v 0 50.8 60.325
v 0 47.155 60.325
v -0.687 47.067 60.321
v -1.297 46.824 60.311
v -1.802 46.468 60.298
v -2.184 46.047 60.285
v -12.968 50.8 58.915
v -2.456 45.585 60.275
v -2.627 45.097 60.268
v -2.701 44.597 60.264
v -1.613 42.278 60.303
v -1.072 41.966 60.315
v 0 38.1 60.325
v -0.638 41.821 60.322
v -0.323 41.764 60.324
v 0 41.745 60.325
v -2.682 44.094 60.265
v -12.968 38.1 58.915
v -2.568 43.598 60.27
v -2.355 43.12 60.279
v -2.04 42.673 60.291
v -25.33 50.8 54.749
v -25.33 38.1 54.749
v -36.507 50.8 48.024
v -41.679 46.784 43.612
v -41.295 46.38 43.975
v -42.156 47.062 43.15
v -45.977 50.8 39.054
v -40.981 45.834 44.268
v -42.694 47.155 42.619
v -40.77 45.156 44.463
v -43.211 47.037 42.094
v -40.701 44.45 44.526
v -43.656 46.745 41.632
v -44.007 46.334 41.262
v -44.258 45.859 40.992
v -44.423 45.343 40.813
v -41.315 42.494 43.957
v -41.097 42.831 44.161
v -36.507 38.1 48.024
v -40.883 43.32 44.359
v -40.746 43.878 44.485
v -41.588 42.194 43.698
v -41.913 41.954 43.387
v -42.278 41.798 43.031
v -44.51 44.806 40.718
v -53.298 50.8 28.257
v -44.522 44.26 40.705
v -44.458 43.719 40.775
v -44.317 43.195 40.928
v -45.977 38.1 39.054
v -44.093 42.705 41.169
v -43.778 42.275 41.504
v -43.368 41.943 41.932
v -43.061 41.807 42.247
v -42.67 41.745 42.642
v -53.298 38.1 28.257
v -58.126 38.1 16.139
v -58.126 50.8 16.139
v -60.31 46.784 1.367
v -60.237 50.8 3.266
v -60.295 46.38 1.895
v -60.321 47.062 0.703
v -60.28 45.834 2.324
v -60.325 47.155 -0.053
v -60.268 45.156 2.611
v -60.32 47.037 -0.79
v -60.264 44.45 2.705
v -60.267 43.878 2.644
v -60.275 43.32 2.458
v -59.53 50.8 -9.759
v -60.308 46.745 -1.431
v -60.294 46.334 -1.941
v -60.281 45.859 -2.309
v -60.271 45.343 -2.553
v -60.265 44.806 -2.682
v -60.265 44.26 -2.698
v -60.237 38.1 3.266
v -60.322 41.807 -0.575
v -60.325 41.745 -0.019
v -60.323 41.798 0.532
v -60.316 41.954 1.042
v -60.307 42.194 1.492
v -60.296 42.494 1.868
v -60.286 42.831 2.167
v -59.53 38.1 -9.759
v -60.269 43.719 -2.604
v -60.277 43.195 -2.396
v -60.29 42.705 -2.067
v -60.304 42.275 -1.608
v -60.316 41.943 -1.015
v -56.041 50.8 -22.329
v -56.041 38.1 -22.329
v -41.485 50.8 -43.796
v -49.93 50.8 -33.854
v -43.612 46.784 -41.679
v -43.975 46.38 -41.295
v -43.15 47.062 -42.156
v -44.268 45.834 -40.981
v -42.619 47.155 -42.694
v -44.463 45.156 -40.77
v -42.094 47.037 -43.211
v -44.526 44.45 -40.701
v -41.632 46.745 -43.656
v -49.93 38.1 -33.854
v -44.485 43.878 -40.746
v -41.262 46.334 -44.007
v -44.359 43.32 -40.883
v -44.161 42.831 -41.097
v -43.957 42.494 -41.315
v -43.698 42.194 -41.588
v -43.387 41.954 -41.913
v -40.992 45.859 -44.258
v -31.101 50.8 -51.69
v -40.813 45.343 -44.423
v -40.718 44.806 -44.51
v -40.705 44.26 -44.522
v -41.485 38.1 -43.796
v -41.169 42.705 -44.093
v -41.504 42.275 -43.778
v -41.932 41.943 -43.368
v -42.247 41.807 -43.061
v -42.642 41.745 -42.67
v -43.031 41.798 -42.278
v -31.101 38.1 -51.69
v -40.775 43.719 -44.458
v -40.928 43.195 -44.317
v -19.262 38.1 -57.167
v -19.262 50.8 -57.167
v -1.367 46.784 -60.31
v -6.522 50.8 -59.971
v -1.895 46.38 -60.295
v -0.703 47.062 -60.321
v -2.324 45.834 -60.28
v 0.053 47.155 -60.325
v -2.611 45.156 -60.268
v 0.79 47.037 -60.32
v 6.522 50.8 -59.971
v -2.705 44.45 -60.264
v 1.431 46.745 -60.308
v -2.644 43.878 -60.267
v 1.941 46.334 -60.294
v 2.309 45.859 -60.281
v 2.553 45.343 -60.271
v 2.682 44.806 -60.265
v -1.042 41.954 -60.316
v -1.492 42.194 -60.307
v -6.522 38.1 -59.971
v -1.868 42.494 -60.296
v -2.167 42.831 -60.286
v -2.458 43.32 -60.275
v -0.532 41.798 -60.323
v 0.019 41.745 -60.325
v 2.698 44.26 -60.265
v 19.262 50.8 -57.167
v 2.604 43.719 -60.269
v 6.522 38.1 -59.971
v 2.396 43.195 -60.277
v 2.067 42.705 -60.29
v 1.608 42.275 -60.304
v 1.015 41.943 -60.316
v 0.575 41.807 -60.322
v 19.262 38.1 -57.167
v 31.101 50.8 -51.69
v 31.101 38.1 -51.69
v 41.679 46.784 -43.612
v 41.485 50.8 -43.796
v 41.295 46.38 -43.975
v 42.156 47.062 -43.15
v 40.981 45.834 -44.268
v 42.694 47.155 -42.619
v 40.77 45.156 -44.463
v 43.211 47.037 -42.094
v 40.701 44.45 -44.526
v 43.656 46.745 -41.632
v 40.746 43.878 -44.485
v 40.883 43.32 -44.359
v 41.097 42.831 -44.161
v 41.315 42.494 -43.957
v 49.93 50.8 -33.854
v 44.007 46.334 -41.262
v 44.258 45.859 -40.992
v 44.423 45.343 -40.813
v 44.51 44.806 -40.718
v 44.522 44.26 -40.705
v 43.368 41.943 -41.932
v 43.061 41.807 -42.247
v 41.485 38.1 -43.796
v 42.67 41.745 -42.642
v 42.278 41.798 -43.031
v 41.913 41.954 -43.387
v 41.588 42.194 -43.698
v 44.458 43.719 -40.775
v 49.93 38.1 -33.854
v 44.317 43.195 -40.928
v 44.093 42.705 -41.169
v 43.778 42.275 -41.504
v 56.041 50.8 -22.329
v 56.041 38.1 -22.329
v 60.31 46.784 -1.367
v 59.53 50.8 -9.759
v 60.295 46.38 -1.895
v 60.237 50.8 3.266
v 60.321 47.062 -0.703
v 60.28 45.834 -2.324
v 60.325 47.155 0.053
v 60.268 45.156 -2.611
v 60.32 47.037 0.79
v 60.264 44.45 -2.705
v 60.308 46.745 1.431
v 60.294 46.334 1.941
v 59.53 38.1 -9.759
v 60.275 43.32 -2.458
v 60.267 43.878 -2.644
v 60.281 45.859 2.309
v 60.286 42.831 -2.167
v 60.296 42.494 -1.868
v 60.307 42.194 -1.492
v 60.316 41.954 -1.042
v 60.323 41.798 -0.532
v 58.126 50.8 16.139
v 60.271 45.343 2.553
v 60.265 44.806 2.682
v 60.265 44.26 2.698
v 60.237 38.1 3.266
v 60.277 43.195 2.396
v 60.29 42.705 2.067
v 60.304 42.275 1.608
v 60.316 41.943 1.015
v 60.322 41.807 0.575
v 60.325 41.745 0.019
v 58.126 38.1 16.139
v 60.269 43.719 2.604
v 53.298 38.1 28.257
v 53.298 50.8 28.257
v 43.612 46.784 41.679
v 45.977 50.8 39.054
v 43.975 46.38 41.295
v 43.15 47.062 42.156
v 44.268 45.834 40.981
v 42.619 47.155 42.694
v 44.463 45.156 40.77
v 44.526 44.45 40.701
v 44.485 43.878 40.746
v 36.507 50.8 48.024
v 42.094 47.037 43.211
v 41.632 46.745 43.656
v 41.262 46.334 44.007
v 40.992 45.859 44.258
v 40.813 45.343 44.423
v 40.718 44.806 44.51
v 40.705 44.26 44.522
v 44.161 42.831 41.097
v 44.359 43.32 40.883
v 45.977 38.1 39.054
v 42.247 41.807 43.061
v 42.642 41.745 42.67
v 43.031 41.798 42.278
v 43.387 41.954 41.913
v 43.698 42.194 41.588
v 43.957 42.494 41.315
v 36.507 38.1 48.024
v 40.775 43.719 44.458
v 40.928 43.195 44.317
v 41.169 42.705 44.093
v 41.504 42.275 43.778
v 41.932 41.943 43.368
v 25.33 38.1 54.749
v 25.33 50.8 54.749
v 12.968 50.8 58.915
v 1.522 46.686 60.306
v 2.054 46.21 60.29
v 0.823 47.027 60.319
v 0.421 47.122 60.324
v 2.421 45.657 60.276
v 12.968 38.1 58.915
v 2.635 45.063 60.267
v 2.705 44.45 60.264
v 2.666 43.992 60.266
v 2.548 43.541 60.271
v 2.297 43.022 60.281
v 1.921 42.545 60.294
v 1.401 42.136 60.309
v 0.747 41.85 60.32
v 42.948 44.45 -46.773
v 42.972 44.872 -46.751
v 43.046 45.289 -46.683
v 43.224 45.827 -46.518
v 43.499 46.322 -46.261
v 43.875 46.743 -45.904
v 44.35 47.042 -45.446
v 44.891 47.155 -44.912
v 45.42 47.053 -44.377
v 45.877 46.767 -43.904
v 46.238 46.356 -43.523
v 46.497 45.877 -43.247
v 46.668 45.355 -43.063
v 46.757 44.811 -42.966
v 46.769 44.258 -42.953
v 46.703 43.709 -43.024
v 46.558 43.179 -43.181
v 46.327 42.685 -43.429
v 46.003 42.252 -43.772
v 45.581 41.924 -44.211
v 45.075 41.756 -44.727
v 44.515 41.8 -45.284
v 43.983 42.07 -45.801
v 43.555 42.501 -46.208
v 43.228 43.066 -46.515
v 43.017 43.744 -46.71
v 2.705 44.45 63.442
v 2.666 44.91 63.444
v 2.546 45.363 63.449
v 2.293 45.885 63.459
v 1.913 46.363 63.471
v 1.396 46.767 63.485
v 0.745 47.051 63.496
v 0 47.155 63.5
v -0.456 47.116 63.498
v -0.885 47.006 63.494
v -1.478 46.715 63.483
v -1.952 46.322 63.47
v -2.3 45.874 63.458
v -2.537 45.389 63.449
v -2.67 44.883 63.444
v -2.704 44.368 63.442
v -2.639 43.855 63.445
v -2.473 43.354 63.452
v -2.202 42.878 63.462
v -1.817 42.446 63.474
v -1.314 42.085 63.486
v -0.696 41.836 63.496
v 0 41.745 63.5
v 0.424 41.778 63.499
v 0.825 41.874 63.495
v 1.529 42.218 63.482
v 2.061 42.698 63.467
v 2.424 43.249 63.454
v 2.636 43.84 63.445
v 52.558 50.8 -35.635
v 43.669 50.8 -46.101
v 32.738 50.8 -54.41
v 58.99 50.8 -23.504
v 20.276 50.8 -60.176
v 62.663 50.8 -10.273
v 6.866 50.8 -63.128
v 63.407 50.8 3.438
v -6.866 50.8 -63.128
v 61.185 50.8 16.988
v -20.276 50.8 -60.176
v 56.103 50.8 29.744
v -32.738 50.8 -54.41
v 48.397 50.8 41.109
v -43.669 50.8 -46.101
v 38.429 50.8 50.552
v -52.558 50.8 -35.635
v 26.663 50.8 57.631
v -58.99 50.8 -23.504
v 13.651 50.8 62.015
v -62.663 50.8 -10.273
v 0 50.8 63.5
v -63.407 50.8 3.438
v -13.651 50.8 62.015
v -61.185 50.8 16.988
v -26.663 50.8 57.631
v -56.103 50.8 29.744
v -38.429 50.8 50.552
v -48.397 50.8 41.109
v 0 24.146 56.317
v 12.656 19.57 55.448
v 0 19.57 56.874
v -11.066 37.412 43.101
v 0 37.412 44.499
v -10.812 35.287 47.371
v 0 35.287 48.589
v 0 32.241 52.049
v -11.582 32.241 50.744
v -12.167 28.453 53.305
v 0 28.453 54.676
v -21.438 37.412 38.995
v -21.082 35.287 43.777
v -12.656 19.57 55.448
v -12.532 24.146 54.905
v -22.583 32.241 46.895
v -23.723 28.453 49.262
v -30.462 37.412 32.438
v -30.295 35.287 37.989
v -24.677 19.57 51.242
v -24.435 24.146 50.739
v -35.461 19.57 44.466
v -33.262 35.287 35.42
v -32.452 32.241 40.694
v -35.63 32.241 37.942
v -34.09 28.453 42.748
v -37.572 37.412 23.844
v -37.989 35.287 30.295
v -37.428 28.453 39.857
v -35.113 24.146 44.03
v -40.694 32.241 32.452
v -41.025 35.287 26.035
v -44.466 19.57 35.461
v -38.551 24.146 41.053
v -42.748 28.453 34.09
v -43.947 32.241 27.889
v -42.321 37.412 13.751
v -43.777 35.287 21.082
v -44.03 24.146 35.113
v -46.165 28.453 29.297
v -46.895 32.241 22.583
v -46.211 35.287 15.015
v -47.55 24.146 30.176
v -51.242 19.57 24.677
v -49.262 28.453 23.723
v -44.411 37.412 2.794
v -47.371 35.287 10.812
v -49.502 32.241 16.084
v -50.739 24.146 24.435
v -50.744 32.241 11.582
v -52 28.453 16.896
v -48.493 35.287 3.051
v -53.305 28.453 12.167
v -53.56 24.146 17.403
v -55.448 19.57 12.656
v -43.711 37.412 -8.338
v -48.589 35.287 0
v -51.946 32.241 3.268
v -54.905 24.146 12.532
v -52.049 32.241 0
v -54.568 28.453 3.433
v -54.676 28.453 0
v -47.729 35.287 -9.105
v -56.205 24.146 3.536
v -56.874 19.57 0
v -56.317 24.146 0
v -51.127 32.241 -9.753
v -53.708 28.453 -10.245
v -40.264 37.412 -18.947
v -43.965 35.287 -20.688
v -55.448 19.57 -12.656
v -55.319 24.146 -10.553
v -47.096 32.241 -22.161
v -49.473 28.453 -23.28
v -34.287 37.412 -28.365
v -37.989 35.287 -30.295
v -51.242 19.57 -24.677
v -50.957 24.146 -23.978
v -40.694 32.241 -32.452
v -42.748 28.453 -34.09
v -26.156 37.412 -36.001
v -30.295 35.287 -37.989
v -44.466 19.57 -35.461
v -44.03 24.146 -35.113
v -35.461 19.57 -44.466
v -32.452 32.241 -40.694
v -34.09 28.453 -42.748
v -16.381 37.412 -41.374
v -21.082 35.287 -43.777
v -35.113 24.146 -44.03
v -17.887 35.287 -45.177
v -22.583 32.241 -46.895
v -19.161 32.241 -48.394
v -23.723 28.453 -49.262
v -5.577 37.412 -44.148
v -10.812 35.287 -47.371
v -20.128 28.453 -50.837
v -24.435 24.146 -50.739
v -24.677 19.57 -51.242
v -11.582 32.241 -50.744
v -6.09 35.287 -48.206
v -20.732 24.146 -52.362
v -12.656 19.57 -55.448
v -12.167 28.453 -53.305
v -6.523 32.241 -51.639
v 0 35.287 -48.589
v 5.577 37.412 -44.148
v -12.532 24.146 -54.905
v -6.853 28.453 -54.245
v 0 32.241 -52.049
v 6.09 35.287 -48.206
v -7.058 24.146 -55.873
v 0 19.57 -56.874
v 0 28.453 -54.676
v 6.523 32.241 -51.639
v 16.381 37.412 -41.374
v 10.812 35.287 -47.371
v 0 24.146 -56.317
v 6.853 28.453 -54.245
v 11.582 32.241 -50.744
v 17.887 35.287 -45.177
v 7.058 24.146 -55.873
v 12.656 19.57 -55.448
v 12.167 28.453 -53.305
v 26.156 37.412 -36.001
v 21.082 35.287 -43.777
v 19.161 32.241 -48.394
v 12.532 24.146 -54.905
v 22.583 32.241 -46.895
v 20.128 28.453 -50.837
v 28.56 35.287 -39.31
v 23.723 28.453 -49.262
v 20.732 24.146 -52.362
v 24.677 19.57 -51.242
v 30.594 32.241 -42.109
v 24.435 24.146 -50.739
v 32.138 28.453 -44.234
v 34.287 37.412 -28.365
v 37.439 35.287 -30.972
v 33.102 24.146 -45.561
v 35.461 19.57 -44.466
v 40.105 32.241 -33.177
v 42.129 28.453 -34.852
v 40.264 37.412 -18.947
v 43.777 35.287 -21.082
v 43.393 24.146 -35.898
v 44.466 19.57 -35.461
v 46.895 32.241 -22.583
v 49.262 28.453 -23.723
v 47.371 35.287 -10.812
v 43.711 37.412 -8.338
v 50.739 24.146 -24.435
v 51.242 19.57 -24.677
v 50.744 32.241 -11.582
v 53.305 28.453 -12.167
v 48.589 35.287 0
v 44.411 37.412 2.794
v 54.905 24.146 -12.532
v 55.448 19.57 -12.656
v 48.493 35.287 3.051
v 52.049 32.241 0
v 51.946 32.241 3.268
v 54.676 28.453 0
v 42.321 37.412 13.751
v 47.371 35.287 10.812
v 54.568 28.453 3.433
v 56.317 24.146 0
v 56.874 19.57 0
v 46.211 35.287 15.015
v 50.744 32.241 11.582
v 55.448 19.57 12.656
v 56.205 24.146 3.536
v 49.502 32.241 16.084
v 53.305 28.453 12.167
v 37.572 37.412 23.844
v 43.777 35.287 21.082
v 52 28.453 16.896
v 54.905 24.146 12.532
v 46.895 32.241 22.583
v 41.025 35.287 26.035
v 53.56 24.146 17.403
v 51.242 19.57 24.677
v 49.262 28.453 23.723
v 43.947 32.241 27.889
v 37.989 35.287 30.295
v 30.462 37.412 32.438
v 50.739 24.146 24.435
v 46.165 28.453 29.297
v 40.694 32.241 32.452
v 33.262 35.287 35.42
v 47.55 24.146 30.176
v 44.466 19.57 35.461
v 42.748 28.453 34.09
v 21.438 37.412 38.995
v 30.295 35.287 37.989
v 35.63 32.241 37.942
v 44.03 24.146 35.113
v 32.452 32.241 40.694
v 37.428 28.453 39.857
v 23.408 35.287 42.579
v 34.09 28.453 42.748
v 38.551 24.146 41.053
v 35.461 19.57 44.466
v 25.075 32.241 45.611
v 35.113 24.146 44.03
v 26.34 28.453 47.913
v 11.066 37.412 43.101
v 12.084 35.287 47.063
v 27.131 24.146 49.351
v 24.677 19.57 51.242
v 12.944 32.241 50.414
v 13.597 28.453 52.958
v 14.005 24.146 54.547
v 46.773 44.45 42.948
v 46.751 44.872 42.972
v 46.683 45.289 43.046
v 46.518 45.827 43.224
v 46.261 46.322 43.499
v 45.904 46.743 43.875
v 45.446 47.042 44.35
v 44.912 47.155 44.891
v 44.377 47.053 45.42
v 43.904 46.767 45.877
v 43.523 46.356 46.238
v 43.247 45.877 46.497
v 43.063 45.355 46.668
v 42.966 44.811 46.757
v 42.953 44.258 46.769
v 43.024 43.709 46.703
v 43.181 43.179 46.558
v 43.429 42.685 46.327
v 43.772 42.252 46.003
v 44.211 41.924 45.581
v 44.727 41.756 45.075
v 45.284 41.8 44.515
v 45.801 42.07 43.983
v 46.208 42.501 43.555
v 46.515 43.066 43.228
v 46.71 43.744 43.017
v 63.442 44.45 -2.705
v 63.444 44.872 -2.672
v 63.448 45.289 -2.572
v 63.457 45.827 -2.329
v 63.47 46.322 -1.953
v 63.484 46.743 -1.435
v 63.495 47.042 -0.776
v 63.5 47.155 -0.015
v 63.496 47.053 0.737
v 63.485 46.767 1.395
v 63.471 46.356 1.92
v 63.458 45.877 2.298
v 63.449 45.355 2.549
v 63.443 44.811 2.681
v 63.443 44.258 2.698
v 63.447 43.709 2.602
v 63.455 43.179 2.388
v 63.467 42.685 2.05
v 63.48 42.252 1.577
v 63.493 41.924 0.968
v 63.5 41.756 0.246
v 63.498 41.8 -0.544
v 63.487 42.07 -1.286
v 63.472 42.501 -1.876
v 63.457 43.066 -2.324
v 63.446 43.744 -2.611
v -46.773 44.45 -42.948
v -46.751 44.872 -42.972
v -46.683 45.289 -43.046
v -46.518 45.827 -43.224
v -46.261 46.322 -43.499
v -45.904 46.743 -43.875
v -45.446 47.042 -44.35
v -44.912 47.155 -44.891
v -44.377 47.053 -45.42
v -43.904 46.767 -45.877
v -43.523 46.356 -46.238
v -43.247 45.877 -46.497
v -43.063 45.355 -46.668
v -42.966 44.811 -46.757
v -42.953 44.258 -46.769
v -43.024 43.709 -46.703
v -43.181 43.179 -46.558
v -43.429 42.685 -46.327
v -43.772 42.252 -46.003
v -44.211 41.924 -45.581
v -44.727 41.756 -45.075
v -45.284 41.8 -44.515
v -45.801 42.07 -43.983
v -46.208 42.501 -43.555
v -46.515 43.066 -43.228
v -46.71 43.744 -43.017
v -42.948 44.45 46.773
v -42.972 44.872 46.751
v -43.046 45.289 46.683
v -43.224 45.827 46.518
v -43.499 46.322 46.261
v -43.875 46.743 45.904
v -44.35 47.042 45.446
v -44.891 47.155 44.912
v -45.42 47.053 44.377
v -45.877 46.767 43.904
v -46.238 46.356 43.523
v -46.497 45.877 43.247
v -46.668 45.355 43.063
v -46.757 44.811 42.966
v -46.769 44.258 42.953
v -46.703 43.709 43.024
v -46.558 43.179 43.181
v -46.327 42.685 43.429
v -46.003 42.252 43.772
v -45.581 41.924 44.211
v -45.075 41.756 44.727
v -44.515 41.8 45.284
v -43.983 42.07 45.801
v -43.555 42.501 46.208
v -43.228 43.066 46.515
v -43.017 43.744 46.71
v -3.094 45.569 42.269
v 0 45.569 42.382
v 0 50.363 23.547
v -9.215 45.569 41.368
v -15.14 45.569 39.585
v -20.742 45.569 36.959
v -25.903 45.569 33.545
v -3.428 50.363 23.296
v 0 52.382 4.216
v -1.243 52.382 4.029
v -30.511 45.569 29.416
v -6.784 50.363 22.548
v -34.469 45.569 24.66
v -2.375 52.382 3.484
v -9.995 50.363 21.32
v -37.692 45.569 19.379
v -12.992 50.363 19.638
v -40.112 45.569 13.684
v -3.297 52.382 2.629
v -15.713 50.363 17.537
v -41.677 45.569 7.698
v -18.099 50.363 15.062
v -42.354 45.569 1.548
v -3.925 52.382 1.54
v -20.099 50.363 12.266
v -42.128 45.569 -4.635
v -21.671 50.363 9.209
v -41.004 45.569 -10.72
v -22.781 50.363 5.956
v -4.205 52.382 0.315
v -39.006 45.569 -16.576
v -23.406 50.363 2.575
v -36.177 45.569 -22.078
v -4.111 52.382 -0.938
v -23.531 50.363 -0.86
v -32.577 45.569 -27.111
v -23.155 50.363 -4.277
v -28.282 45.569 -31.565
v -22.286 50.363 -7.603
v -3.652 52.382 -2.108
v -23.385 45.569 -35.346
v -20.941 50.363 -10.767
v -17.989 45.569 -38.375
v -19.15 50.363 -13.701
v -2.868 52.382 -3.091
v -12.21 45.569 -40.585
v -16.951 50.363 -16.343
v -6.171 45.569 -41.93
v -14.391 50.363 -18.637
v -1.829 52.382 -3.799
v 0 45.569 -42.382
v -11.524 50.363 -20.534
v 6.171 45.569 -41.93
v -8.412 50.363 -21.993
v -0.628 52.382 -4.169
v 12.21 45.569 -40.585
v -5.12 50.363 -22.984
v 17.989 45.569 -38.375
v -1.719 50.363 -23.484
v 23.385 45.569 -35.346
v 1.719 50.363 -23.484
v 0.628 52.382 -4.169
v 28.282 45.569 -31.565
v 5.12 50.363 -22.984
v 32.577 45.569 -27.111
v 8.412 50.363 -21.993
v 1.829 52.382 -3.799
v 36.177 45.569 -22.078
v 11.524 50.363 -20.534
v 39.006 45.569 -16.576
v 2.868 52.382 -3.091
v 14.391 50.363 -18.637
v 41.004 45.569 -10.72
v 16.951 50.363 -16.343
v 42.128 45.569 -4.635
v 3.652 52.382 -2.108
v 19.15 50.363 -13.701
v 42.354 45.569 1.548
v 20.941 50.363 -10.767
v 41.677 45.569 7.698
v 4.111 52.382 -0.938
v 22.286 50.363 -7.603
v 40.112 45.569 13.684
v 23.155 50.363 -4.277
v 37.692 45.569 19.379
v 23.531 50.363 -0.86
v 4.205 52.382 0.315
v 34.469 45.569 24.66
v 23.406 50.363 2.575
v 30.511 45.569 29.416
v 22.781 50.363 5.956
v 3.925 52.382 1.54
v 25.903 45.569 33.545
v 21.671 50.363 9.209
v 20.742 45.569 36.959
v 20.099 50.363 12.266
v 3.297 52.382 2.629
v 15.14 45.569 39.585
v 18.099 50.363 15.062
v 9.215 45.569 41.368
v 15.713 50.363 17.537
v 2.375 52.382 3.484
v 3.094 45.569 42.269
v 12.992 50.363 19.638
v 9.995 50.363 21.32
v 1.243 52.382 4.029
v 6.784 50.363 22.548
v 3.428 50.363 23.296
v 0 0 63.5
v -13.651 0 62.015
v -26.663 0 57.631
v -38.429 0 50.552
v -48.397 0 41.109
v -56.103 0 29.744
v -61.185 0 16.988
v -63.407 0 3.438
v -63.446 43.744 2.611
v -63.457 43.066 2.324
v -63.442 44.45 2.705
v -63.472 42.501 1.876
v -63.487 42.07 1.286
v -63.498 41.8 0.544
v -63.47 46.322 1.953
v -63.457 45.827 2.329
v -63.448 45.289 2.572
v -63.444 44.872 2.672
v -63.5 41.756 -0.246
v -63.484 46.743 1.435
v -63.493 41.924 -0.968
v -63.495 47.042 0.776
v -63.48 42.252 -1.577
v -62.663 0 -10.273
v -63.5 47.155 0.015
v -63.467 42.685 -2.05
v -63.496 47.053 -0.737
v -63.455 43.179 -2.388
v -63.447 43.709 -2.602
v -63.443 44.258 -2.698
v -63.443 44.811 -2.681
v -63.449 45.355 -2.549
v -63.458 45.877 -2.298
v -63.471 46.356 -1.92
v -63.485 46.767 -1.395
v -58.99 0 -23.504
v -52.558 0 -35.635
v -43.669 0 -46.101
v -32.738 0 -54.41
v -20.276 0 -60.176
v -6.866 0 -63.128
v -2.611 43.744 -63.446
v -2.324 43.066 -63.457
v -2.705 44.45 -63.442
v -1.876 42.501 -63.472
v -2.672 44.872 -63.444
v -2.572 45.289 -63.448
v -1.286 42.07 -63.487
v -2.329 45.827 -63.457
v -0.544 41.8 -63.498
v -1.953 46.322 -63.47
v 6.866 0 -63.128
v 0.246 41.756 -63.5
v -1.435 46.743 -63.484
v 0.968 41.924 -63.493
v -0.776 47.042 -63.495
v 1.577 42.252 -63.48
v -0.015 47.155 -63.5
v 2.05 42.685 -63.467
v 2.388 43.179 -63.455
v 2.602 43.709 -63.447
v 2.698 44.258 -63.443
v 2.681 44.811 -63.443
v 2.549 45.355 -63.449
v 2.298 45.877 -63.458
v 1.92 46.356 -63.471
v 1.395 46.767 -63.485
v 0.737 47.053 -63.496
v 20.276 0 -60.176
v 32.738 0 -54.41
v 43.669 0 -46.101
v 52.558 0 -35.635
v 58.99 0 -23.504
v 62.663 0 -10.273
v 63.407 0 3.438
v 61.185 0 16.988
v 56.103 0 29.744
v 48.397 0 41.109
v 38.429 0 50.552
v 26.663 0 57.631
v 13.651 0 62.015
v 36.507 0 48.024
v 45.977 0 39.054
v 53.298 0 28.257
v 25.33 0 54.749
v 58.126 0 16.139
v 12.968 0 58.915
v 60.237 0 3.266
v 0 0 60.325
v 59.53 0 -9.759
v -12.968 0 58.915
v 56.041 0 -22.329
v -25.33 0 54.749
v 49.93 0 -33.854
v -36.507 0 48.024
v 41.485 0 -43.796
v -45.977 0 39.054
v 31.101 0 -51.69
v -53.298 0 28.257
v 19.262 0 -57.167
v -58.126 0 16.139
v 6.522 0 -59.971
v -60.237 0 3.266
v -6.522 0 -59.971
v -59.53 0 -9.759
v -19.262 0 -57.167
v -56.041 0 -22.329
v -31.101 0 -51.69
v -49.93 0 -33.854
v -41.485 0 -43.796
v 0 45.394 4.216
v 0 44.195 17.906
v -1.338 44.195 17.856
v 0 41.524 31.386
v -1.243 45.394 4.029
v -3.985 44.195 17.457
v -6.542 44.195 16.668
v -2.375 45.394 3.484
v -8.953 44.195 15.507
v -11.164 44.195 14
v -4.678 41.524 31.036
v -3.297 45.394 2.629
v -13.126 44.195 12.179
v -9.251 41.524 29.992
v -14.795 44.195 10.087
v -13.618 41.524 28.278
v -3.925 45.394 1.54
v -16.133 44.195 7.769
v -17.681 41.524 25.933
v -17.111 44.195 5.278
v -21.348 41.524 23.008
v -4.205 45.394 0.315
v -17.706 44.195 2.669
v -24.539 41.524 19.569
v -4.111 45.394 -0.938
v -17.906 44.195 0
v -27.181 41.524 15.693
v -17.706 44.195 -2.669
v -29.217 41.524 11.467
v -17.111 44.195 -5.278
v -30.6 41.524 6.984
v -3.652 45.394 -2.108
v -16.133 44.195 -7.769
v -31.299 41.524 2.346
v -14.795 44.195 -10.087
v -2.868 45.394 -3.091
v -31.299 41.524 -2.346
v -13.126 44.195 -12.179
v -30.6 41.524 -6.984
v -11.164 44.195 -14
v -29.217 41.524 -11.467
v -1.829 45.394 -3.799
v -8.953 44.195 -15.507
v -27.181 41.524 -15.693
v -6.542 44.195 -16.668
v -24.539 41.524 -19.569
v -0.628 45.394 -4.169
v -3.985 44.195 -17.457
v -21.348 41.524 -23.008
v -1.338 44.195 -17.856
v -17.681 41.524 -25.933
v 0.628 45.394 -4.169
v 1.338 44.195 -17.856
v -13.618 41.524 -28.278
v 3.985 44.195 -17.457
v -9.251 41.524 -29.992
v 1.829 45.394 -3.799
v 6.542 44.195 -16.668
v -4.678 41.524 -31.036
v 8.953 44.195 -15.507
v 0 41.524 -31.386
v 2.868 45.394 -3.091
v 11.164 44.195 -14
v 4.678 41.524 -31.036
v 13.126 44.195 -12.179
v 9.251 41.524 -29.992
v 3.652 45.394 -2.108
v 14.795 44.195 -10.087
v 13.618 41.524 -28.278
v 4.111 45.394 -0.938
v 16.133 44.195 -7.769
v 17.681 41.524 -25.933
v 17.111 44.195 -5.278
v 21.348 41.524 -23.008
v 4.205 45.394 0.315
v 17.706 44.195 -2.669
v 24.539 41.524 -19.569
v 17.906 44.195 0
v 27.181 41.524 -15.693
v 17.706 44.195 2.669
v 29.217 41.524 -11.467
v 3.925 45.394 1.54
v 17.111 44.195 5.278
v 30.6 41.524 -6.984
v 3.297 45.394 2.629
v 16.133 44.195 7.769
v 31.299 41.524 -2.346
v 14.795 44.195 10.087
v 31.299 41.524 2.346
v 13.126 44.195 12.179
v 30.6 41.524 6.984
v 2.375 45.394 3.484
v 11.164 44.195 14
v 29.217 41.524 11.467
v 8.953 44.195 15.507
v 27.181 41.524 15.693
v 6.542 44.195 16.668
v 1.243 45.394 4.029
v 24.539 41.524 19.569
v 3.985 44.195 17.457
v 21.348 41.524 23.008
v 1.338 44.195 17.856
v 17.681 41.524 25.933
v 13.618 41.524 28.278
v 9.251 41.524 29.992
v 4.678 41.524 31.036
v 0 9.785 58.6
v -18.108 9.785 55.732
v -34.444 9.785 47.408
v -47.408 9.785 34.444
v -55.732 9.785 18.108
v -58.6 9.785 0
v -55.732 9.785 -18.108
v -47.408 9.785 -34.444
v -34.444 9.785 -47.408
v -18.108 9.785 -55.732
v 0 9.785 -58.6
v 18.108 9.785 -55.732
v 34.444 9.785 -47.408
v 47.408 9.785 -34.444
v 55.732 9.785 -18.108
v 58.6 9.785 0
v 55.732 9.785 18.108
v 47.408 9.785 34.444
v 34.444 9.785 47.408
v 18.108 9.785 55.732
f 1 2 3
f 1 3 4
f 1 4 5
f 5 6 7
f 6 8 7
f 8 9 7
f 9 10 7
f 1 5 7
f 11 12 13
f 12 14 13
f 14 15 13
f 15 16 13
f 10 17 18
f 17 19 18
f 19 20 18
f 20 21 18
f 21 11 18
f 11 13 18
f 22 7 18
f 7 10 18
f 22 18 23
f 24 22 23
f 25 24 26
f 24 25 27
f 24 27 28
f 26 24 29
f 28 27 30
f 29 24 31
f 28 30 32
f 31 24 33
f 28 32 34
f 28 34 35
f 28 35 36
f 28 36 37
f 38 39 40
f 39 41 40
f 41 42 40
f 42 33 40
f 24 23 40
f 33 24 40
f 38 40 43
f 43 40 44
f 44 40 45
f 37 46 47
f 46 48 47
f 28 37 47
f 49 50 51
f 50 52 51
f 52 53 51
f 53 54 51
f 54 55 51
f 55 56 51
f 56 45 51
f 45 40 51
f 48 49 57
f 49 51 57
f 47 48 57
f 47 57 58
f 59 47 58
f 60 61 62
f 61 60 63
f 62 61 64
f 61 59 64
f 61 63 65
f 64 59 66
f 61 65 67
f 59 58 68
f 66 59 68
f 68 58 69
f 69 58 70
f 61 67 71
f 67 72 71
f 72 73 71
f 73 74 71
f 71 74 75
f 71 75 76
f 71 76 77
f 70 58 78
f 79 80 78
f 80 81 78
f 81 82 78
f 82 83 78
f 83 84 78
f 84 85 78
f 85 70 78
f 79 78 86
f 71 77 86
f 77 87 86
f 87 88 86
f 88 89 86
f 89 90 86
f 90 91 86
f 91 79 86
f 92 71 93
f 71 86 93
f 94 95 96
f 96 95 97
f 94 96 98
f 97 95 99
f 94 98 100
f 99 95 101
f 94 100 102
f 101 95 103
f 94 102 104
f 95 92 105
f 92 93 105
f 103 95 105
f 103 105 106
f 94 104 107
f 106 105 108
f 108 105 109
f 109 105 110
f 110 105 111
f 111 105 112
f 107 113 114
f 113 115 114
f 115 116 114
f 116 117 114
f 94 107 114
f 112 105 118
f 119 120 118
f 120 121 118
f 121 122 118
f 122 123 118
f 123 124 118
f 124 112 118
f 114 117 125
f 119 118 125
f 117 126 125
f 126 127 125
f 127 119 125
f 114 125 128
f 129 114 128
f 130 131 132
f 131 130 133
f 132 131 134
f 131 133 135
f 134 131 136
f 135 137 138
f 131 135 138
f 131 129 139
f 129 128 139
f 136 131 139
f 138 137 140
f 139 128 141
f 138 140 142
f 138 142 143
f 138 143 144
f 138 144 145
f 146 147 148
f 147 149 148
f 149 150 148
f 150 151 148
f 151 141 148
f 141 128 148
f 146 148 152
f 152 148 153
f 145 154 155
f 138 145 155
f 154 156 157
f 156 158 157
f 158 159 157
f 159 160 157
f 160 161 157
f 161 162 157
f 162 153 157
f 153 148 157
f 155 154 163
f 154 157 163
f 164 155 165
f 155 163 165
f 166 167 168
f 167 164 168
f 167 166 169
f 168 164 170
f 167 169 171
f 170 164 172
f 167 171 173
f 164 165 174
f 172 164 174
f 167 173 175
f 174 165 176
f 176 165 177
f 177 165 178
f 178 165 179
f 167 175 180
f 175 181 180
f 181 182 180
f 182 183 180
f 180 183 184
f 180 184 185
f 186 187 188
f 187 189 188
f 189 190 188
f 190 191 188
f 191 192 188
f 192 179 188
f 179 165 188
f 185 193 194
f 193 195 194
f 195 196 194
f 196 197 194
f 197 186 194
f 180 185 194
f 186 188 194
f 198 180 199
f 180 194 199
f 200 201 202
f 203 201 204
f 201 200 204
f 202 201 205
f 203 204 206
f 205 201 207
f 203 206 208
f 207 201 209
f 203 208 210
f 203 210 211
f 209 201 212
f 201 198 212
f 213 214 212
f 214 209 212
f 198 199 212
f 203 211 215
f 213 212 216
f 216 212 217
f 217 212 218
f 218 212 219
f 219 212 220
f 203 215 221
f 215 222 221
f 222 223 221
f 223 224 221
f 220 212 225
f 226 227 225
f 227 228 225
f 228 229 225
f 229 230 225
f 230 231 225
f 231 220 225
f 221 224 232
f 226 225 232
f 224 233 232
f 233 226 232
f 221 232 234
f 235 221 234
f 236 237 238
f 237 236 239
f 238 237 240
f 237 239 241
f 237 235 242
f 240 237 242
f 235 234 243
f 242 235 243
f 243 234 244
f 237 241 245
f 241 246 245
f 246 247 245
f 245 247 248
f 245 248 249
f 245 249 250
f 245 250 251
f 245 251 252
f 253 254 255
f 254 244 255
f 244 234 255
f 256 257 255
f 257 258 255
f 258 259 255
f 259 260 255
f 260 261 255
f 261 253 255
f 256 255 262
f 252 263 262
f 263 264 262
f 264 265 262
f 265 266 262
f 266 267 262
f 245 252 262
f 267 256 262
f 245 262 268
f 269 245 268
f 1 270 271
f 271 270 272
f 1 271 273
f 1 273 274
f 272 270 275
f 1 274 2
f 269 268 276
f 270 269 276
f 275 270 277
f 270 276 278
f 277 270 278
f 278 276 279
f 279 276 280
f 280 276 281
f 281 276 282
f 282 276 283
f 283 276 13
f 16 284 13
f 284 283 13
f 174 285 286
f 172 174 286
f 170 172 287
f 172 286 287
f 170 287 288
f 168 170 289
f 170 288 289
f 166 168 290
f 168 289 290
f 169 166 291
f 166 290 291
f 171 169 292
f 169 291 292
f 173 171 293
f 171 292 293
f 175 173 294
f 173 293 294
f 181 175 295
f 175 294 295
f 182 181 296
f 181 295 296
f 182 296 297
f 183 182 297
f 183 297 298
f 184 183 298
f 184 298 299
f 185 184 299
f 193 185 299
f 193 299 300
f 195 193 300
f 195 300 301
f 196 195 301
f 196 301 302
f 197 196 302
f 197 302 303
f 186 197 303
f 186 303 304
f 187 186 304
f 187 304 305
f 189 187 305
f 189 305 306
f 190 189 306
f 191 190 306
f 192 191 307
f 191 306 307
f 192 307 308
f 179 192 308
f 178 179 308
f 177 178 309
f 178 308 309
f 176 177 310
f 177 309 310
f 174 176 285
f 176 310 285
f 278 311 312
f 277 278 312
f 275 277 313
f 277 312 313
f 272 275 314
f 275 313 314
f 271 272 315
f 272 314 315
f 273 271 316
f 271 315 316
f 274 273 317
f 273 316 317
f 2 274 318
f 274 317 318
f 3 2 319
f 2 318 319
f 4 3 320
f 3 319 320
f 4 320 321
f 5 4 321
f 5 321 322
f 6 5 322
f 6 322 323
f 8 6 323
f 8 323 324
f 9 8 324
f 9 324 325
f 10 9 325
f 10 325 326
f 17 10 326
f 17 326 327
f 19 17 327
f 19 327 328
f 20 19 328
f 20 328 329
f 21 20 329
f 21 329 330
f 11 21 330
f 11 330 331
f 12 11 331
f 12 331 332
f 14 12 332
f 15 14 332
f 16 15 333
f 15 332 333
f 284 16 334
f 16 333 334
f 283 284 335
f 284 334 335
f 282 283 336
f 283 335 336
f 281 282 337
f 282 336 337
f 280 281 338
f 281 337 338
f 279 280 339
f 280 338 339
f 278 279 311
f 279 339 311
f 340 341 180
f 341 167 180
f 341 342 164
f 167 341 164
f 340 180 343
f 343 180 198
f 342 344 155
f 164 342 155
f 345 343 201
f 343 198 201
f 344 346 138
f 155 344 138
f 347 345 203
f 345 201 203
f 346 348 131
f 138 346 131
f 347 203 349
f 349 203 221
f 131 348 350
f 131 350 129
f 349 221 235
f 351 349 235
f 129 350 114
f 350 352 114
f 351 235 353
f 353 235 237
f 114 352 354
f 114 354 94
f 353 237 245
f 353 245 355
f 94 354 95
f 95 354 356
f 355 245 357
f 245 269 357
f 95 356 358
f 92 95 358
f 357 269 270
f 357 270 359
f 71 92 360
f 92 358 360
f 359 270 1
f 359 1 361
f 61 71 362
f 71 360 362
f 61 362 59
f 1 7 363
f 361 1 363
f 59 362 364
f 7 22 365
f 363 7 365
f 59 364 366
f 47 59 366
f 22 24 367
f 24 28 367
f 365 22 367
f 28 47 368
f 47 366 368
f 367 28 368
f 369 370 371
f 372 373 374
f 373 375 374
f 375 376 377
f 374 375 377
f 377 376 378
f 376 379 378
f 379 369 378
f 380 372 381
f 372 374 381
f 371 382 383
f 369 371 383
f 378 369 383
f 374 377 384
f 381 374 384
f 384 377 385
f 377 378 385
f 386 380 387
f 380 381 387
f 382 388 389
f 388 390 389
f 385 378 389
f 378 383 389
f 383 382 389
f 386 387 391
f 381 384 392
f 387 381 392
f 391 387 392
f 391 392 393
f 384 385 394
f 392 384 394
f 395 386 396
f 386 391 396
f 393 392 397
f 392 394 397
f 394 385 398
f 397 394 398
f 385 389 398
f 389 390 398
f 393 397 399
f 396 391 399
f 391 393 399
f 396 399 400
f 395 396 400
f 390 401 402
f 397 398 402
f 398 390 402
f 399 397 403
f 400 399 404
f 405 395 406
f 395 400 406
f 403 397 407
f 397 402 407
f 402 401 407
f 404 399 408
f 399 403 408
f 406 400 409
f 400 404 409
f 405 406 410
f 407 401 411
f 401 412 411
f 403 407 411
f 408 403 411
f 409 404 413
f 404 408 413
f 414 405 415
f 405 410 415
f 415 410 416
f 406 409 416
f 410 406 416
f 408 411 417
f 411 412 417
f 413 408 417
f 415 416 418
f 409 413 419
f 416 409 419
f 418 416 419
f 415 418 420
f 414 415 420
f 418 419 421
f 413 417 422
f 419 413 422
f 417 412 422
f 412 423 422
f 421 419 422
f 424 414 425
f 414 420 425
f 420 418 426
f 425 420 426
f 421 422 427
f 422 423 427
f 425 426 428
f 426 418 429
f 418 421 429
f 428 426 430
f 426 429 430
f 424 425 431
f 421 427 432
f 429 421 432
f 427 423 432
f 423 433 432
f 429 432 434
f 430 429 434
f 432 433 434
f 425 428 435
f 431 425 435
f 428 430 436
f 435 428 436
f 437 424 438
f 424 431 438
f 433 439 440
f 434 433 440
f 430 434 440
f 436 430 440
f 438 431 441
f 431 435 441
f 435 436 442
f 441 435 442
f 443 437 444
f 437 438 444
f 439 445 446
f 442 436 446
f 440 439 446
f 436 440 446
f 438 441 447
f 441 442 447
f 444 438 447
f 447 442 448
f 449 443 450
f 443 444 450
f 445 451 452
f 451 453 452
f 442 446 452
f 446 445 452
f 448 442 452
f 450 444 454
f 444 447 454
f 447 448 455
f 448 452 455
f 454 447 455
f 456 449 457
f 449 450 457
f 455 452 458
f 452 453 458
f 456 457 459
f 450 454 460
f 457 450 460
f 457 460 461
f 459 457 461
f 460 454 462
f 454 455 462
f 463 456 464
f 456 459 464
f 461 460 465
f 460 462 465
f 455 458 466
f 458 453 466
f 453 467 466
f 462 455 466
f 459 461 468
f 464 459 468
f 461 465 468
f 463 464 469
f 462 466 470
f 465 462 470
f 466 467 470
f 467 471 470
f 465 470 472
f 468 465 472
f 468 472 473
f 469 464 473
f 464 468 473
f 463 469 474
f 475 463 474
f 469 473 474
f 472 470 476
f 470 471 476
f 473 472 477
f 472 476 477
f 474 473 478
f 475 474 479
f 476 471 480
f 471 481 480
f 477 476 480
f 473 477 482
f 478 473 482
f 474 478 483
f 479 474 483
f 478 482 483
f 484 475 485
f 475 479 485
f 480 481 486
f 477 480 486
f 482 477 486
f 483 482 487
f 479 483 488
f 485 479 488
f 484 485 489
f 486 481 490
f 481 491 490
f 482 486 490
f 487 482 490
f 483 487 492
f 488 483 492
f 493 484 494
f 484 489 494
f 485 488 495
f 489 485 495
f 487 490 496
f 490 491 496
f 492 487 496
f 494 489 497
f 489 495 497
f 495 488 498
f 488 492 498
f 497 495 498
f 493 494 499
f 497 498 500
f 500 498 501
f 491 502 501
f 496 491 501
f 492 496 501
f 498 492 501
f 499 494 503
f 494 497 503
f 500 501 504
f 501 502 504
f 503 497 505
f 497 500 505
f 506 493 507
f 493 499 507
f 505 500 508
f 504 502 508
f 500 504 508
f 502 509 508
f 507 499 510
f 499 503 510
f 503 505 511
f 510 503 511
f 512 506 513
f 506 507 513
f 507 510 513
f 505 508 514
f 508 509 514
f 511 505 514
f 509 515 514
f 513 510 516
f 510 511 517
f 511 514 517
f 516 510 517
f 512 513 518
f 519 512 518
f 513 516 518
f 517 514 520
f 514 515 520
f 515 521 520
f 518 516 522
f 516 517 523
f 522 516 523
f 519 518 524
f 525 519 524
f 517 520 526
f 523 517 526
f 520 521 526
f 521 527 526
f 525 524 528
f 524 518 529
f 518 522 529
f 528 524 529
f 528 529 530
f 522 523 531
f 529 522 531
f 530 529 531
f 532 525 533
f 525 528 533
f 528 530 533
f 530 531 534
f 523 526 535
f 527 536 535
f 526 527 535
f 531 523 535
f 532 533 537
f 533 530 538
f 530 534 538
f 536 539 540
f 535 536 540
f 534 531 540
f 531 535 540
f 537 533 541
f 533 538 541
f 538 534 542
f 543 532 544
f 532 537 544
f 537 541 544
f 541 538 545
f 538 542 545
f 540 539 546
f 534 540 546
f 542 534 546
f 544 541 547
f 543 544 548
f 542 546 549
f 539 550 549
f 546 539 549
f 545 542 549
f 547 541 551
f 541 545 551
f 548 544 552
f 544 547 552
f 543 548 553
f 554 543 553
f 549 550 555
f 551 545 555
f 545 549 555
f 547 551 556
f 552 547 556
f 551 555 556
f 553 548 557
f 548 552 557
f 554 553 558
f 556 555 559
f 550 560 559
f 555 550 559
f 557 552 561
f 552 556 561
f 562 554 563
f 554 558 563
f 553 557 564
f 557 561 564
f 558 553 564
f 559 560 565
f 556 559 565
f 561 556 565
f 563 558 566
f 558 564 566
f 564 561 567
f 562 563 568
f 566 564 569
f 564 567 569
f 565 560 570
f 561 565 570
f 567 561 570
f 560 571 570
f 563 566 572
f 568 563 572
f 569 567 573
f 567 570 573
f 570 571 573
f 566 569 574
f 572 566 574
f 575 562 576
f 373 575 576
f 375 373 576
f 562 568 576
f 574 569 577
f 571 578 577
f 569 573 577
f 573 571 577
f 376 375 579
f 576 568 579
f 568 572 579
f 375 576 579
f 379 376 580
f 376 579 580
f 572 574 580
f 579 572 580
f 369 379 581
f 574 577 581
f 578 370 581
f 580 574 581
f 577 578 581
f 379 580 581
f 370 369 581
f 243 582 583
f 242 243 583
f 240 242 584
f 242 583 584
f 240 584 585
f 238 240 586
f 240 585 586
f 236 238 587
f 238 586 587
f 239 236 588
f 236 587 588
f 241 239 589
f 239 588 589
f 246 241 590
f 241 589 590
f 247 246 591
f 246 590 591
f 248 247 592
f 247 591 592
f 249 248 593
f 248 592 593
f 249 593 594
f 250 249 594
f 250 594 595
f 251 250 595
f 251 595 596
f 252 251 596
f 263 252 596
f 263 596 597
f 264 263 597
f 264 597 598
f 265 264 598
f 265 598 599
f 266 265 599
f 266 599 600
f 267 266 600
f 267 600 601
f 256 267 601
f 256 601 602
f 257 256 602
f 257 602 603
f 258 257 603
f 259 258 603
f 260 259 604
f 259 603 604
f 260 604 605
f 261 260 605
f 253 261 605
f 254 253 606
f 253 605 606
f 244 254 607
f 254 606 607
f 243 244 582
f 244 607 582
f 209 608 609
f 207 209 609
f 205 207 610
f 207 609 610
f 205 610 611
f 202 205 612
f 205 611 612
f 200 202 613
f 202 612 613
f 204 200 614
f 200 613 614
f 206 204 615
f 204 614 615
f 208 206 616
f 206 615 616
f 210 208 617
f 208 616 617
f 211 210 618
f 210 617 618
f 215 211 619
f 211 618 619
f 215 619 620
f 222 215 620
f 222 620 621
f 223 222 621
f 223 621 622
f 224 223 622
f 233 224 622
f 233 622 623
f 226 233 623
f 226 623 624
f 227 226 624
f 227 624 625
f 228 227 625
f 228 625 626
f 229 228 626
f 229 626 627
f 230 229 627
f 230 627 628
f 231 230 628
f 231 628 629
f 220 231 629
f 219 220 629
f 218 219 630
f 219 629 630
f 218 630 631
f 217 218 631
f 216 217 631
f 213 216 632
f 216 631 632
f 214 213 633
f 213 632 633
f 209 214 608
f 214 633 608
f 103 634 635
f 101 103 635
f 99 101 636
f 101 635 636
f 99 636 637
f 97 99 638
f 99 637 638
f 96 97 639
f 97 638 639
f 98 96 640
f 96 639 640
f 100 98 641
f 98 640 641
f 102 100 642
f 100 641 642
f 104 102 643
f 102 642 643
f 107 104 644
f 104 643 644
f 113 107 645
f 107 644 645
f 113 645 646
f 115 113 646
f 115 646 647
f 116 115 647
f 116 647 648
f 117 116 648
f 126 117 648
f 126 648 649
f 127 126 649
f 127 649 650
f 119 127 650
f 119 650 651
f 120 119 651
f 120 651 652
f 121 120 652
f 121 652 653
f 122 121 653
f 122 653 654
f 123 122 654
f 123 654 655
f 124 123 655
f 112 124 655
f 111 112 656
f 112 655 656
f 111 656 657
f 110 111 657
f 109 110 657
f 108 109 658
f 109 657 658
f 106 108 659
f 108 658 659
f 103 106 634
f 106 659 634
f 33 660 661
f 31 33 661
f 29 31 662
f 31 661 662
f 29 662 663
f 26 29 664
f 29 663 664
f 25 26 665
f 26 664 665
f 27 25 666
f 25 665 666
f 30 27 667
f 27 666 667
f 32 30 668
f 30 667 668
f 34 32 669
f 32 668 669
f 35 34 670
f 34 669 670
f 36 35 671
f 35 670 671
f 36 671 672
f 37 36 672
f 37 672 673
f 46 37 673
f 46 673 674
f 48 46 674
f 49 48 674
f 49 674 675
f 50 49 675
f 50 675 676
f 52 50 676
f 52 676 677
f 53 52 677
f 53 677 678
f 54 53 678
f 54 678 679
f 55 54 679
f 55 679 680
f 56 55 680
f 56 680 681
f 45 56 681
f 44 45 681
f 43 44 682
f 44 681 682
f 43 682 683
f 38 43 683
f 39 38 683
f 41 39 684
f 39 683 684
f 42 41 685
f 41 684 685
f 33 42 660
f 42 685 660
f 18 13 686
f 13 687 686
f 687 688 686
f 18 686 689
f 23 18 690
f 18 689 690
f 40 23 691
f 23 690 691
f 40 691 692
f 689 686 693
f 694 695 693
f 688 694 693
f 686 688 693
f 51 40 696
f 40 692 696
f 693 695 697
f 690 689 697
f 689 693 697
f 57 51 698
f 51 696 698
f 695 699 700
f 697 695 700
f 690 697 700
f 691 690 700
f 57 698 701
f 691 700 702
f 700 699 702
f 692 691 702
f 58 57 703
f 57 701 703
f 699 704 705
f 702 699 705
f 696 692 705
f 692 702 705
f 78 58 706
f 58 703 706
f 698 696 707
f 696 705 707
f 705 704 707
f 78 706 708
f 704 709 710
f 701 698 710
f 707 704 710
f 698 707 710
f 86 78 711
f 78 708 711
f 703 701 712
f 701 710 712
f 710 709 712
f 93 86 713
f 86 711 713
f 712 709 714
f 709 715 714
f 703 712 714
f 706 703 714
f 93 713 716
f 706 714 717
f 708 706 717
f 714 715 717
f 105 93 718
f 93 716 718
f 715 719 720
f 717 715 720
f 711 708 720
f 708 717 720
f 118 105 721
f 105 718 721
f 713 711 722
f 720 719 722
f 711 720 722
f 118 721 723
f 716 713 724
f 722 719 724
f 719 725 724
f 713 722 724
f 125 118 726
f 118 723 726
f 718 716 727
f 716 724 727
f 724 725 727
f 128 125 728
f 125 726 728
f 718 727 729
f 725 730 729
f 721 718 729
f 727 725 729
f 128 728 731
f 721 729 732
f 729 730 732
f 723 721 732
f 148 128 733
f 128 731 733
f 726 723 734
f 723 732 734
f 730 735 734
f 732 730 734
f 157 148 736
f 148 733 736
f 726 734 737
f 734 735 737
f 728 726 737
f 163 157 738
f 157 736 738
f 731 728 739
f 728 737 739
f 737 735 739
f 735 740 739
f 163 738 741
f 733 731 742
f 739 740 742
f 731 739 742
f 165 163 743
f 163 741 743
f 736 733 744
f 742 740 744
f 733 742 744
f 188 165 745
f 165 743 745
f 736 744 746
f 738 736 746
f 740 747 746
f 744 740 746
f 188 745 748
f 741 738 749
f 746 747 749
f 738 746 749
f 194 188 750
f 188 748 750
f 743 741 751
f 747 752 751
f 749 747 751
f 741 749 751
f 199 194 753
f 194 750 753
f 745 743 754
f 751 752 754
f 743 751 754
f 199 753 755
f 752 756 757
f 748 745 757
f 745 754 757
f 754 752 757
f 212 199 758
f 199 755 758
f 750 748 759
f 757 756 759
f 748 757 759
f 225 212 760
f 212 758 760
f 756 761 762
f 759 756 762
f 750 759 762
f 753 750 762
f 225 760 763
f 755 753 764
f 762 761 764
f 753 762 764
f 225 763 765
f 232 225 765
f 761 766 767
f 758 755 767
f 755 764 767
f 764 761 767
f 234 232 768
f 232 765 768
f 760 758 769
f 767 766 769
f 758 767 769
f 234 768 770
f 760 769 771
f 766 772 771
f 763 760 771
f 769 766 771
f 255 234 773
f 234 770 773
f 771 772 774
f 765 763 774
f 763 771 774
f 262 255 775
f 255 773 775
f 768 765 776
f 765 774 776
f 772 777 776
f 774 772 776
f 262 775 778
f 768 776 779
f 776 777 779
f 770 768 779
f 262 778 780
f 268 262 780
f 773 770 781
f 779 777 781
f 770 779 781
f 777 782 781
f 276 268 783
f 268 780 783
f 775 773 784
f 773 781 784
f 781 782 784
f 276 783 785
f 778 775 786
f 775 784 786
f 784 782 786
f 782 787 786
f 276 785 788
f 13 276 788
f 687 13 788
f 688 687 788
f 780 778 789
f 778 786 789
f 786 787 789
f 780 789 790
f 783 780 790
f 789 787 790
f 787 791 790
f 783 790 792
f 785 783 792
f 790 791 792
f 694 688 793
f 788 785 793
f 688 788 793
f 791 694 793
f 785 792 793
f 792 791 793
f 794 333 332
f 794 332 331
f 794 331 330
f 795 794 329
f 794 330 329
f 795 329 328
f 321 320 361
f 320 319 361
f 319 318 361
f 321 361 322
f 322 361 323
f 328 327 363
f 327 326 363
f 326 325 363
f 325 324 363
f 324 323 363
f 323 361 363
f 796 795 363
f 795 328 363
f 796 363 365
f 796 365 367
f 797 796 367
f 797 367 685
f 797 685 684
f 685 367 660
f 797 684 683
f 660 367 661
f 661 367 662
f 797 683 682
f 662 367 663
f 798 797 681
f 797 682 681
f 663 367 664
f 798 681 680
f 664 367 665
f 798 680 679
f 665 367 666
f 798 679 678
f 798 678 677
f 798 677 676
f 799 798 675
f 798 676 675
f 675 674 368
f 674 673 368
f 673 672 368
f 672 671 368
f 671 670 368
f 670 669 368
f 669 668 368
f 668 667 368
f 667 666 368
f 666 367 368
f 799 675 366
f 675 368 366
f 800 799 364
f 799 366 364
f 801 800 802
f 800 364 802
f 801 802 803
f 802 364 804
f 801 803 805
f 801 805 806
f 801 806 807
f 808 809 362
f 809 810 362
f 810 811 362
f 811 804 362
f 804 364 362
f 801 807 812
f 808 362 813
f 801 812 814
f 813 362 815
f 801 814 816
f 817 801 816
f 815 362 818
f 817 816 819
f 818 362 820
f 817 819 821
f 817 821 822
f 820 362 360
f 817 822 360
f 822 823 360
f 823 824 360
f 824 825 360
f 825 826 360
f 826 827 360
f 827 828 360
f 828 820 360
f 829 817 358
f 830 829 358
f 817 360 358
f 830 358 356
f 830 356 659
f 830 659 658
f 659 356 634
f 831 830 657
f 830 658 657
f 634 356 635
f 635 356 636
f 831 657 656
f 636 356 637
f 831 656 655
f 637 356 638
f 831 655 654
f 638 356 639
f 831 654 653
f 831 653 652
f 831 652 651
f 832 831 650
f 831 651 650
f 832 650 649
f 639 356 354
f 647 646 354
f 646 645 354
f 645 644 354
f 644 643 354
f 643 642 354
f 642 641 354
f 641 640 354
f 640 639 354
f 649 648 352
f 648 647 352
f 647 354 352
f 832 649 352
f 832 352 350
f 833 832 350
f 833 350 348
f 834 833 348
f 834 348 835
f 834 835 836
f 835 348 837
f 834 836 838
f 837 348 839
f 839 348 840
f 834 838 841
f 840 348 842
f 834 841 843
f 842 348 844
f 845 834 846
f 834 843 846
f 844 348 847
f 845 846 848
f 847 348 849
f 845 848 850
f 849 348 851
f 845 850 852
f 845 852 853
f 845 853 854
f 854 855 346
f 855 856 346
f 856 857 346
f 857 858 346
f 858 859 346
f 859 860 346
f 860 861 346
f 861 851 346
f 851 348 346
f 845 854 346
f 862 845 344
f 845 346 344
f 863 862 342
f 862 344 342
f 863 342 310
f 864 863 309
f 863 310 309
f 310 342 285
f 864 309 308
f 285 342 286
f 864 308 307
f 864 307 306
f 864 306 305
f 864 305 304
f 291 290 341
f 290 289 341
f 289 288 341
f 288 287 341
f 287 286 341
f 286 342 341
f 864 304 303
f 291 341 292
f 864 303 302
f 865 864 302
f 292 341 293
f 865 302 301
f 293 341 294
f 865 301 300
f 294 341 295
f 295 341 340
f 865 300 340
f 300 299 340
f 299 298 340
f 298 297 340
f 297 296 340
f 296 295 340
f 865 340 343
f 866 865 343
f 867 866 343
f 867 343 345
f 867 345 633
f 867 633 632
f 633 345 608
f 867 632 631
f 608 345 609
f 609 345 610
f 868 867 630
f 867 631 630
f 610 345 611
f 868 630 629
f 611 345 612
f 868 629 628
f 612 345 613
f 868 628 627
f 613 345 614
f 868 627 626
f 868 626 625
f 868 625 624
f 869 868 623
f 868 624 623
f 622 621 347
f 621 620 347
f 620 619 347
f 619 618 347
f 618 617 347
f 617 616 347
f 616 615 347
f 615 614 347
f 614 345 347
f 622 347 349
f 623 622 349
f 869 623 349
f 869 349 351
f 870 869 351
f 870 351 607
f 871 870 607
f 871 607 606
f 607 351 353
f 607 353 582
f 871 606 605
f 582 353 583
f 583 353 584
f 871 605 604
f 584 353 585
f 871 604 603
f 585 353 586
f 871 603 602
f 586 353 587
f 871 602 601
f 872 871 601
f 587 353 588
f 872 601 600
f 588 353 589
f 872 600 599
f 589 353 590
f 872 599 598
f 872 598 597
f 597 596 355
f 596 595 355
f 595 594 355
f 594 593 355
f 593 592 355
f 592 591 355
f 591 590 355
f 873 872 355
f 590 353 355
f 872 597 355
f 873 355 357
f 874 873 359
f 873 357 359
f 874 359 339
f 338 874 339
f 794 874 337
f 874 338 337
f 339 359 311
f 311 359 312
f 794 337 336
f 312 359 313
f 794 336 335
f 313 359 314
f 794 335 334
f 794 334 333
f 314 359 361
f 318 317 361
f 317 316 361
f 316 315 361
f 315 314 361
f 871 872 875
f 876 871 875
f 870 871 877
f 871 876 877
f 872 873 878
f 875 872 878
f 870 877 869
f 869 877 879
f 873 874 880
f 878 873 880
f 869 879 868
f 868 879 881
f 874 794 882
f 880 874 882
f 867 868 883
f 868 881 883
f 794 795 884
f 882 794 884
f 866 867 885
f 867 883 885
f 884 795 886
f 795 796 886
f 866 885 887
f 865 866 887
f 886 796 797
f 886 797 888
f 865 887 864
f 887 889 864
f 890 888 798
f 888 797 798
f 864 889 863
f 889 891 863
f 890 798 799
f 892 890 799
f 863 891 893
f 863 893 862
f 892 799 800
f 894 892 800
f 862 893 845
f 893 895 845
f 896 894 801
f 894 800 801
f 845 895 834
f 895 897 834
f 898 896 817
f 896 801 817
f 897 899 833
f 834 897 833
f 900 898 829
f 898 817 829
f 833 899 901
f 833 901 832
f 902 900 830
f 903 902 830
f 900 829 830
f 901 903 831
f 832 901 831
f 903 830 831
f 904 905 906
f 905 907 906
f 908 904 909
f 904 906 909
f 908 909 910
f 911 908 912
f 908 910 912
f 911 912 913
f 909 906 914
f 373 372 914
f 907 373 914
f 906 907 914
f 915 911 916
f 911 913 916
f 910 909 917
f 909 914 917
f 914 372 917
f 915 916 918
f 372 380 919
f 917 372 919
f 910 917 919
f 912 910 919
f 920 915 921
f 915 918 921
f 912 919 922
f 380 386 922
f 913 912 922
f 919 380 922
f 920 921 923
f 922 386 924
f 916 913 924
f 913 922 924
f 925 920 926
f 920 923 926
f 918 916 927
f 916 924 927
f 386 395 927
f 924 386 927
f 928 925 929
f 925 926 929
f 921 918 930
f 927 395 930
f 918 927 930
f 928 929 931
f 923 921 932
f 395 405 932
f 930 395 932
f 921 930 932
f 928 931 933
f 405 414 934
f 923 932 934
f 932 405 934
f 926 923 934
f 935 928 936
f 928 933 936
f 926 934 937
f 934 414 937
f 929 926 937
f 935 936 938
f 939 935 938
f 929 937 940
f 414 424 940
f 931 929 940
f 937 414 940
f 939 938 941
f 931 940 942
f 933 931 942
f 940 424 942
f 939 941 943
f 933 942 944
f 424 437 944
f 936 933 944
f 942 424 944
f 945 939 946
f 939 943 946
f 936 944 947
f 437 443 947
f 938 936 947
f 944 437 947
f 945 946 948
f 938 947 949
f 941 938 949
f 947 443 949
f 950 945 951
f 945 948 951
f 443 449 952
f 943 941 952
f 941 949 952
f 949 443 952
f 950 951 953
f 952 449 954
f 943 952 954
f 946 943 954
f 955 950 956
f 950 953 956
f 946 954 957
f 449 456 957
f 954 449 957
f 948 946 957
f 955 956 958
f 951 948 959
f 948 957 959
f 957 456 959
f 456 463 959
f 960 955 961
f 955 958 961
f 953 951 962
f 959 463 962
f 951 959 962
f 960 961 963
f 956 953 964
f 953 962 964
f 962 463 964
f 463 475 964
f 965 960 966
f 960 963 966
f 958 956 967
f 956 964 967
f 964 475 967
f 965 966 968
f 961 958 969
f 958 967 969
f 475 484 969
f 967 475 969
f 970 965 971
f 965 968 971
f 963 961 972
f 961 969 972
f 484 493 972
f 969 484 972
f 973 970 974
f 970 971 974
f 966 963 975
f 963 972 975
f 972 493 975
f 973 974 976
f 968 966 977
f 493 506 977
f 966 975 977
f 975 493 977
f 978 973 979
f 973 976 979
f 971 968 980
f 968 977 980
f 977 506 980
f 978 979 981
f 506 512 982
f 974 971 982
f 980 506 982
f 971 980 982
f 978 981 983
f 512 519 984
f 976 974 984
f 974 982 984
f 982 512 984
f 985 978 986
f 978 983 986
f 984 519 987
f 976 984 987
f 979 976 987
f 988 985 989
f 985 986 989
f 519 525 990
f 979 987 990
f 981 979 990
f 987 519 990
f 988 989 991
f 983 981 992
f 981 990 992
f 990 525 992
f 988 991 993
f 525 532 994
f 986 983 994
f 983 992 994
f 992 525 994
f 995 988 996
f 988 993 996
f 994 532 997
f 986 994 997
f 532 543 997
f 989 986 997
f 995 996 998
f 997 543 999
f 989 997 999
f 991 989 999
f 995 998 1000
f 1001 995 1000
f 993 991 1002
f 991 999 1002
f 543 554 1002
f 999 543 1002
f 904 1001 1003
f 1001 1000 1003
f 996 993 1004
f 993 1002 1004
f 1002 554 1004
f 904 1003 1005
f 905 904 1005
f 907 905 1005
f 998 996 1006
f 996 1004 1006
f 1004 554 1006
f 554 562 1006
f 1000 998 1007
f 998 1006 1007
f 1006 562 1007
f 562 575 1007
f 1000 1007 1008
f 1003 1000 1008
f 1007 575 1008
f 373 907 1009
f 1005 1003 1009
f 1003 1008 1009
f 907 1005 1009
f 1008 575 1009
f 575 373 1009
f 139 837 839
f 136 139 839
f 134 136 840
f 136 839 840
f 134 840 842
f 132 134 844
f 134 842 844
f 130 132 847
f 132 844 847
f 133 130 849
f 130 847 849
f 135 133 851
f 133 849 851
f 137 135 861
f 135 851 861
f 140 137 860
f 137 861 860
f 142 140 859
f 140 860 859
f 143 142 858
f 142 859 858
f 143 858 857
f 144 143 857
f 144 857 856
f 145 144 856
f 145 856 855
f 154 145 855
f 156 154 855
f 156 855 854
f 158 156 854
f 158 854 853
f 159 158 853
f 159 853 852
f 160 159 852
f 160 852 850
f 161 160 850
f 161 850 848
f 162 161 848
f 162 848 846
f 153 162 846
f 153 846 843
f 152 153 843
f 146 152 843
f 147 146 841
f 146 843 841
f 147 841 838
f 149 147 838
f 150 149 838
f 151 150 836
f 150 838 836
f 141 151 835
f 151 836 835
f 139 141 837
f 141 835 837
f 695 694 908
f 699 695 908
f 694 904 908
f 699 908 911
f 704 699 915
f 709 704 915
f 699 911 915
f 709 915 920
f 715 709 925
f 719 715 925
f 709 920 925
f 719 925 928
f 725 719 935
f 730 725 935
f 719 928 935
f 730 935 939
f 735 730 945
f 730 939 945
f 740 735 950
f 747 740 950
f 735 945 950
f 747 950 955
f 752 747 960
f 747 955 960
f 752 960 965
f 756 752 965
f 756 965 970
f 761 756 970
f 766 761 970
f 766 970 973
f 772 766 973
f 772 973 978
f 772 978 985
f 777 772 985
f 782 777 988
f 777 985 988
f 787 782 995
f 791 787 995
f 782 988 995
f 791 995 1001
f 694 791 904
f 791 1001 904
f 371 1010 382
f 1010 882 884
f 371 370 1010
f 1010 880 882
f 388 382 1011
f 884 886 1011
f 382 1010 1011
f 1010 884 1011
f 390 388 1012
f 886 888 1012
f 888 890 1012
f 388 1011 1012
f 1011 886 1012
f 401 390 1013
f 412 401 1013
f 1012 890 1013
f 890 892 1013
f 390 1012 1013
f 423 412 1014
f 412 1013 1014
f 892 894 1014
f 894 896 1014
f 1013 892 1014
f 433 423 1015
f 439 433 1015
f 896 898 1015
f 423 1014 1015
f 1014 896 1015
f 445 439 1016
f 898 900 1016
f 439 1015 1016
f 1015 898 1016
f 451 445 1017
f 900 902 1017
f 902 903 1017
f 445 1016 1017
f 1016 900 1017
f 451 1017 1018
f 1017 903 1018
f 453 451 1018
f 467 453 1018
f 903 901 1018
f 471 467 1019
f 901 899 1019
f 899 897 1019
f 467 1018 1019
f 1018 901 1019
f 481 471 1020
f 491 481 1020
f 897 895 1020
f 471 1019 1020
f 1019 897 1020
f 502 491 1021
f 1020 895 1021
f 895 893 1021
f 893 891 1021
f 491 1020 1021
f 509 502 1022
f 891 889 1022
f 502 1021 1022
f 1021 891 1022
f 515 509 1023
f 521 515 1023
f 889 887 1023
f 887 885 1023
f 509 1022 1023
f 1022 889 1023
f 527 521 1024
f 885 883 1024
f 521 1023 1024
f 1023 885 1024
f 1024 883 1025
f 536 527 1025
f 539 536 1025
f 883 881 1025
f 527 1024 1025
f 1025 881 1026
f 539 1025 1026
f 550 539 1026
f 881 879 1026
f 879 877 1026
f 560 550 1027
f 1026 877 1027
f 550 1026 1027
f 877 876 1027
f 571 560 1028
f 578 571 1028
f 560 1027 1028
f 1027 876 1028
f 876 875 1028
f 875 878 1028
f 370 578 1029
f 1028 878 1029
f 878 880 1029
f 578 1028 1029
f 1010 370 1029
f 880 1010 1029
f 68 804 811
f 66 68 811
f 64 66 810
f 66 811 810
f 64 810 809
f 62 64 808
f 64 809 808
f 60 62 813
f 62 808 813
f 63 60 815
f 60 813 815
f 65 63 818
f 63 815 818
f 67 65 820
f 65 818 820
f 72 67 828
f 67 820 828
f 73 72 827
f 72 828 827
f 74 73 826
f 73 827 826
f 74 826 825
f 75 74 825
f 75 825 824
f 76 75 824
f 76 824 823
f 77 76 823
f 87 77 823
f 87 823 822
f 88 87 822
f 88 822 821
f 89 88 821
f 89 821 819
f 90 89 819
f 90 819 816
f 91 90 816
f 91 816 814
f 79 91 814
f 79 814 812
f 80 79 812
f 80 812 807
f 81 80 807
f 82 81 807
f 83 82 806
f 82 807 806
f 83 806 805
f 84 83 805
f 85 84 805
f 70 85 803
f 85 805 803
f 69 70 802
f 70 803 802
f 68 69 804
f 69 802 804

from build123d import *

# Parameters (mm, degrees)
F_3_0_213_DIAMETER_HOLE1_REACH  = 150.785
F_3_0_213_DIAMETER_HOLE1_BORE_R = 2.7051
CIRPATTERN1_COUNT               = 8


with BuildPart() as part:
    # Sketch1 → Revolve2 (revolve)
    with BuildSketch(Plane.XY, mode=Mode.PRIVATE) as revolve2_sk:
        with BuildLine():
            Line((-63.5, 0), (-63.5, 50.8))
            Line((-63.5, 50.8), (-60.325, 50.8))
            Line((-60.325, 50.8), (-60.325, 38.1))
            ThreePointArc((-60.325, 38.1), (-33.051376431, 48.308044626), (-4.2164, 52.382213484))
            Line((-4.2164, 52.382213484), (-4.2164, 45.393561735))
            ThreePointArc((-4.2164, 45.393561735), (-24.682494429, 43.041960117), (-44.499135715, 37.412414884))
            ThreePointArc((-44.499135715, 37.412414884), (-53.477680006, 30.42702697), (-56.874265357, 19.570088643))
            Line((-56.874265357, 19.570088643), (-60.325, 0))
            Line((-60.325, 0), (-63.5, 0))
        make_face()
    revolve(revolve2_sk.sketch.rotate(Axis((0, 127.060987048, 0), (0, -1, 0)), 270), axis=Axis((0, 127.060987048, 0), (0, -1, 0)))

    # #3 (0.213) Diameter Hole1 bore (on position points) → #3 (0.213) Diameter Hole1 (cut, up to next)
    with BuildSketch(Plane(origin=(0, 44.45, 63.5), x_dir=(1, 0, 0), z_dir=(0, 0, 1)), mode=Mode.PRIVATE) as f_3_0_213_diameter_hole1_sk1:
        Circle(F_3_0_213_DIAMETER_HOLE1_BORE_R)
    f_3_0_213_diameter_hole1_tool1 = extrude(f_3_0_213_diameter_hole1_sk1.sketch, amount=-F_3_0_213_DIAMETER_HOLE1_REACH, mode=Mode.PRIVATE) & part.part
    f_3_0_213_diameter_hole1 = f_3_0_213_diameter_hole1_tool1.solids().sort_by_distance((0, 44.45, 63.5))[0]
    add(f_3_0_213_diameter_hole1, mode=Mode.SUBTRACT)

    # CirPattern1: #3 (0.213) Diameter Hole1 ×8 about axis
    cirpattern1_axis = Axis((0, 127.060987048, 0), (0, -1, 0))
    for i in range(1, CIRPATTERN1_COUNT):
        add(f_3_0_213_diameter_hole1.rotate(cirpattern1_axis, i * 360 / CIRPATTERN1_COUNT), mode=Mode.SUBTRACT)


solid = part.part
